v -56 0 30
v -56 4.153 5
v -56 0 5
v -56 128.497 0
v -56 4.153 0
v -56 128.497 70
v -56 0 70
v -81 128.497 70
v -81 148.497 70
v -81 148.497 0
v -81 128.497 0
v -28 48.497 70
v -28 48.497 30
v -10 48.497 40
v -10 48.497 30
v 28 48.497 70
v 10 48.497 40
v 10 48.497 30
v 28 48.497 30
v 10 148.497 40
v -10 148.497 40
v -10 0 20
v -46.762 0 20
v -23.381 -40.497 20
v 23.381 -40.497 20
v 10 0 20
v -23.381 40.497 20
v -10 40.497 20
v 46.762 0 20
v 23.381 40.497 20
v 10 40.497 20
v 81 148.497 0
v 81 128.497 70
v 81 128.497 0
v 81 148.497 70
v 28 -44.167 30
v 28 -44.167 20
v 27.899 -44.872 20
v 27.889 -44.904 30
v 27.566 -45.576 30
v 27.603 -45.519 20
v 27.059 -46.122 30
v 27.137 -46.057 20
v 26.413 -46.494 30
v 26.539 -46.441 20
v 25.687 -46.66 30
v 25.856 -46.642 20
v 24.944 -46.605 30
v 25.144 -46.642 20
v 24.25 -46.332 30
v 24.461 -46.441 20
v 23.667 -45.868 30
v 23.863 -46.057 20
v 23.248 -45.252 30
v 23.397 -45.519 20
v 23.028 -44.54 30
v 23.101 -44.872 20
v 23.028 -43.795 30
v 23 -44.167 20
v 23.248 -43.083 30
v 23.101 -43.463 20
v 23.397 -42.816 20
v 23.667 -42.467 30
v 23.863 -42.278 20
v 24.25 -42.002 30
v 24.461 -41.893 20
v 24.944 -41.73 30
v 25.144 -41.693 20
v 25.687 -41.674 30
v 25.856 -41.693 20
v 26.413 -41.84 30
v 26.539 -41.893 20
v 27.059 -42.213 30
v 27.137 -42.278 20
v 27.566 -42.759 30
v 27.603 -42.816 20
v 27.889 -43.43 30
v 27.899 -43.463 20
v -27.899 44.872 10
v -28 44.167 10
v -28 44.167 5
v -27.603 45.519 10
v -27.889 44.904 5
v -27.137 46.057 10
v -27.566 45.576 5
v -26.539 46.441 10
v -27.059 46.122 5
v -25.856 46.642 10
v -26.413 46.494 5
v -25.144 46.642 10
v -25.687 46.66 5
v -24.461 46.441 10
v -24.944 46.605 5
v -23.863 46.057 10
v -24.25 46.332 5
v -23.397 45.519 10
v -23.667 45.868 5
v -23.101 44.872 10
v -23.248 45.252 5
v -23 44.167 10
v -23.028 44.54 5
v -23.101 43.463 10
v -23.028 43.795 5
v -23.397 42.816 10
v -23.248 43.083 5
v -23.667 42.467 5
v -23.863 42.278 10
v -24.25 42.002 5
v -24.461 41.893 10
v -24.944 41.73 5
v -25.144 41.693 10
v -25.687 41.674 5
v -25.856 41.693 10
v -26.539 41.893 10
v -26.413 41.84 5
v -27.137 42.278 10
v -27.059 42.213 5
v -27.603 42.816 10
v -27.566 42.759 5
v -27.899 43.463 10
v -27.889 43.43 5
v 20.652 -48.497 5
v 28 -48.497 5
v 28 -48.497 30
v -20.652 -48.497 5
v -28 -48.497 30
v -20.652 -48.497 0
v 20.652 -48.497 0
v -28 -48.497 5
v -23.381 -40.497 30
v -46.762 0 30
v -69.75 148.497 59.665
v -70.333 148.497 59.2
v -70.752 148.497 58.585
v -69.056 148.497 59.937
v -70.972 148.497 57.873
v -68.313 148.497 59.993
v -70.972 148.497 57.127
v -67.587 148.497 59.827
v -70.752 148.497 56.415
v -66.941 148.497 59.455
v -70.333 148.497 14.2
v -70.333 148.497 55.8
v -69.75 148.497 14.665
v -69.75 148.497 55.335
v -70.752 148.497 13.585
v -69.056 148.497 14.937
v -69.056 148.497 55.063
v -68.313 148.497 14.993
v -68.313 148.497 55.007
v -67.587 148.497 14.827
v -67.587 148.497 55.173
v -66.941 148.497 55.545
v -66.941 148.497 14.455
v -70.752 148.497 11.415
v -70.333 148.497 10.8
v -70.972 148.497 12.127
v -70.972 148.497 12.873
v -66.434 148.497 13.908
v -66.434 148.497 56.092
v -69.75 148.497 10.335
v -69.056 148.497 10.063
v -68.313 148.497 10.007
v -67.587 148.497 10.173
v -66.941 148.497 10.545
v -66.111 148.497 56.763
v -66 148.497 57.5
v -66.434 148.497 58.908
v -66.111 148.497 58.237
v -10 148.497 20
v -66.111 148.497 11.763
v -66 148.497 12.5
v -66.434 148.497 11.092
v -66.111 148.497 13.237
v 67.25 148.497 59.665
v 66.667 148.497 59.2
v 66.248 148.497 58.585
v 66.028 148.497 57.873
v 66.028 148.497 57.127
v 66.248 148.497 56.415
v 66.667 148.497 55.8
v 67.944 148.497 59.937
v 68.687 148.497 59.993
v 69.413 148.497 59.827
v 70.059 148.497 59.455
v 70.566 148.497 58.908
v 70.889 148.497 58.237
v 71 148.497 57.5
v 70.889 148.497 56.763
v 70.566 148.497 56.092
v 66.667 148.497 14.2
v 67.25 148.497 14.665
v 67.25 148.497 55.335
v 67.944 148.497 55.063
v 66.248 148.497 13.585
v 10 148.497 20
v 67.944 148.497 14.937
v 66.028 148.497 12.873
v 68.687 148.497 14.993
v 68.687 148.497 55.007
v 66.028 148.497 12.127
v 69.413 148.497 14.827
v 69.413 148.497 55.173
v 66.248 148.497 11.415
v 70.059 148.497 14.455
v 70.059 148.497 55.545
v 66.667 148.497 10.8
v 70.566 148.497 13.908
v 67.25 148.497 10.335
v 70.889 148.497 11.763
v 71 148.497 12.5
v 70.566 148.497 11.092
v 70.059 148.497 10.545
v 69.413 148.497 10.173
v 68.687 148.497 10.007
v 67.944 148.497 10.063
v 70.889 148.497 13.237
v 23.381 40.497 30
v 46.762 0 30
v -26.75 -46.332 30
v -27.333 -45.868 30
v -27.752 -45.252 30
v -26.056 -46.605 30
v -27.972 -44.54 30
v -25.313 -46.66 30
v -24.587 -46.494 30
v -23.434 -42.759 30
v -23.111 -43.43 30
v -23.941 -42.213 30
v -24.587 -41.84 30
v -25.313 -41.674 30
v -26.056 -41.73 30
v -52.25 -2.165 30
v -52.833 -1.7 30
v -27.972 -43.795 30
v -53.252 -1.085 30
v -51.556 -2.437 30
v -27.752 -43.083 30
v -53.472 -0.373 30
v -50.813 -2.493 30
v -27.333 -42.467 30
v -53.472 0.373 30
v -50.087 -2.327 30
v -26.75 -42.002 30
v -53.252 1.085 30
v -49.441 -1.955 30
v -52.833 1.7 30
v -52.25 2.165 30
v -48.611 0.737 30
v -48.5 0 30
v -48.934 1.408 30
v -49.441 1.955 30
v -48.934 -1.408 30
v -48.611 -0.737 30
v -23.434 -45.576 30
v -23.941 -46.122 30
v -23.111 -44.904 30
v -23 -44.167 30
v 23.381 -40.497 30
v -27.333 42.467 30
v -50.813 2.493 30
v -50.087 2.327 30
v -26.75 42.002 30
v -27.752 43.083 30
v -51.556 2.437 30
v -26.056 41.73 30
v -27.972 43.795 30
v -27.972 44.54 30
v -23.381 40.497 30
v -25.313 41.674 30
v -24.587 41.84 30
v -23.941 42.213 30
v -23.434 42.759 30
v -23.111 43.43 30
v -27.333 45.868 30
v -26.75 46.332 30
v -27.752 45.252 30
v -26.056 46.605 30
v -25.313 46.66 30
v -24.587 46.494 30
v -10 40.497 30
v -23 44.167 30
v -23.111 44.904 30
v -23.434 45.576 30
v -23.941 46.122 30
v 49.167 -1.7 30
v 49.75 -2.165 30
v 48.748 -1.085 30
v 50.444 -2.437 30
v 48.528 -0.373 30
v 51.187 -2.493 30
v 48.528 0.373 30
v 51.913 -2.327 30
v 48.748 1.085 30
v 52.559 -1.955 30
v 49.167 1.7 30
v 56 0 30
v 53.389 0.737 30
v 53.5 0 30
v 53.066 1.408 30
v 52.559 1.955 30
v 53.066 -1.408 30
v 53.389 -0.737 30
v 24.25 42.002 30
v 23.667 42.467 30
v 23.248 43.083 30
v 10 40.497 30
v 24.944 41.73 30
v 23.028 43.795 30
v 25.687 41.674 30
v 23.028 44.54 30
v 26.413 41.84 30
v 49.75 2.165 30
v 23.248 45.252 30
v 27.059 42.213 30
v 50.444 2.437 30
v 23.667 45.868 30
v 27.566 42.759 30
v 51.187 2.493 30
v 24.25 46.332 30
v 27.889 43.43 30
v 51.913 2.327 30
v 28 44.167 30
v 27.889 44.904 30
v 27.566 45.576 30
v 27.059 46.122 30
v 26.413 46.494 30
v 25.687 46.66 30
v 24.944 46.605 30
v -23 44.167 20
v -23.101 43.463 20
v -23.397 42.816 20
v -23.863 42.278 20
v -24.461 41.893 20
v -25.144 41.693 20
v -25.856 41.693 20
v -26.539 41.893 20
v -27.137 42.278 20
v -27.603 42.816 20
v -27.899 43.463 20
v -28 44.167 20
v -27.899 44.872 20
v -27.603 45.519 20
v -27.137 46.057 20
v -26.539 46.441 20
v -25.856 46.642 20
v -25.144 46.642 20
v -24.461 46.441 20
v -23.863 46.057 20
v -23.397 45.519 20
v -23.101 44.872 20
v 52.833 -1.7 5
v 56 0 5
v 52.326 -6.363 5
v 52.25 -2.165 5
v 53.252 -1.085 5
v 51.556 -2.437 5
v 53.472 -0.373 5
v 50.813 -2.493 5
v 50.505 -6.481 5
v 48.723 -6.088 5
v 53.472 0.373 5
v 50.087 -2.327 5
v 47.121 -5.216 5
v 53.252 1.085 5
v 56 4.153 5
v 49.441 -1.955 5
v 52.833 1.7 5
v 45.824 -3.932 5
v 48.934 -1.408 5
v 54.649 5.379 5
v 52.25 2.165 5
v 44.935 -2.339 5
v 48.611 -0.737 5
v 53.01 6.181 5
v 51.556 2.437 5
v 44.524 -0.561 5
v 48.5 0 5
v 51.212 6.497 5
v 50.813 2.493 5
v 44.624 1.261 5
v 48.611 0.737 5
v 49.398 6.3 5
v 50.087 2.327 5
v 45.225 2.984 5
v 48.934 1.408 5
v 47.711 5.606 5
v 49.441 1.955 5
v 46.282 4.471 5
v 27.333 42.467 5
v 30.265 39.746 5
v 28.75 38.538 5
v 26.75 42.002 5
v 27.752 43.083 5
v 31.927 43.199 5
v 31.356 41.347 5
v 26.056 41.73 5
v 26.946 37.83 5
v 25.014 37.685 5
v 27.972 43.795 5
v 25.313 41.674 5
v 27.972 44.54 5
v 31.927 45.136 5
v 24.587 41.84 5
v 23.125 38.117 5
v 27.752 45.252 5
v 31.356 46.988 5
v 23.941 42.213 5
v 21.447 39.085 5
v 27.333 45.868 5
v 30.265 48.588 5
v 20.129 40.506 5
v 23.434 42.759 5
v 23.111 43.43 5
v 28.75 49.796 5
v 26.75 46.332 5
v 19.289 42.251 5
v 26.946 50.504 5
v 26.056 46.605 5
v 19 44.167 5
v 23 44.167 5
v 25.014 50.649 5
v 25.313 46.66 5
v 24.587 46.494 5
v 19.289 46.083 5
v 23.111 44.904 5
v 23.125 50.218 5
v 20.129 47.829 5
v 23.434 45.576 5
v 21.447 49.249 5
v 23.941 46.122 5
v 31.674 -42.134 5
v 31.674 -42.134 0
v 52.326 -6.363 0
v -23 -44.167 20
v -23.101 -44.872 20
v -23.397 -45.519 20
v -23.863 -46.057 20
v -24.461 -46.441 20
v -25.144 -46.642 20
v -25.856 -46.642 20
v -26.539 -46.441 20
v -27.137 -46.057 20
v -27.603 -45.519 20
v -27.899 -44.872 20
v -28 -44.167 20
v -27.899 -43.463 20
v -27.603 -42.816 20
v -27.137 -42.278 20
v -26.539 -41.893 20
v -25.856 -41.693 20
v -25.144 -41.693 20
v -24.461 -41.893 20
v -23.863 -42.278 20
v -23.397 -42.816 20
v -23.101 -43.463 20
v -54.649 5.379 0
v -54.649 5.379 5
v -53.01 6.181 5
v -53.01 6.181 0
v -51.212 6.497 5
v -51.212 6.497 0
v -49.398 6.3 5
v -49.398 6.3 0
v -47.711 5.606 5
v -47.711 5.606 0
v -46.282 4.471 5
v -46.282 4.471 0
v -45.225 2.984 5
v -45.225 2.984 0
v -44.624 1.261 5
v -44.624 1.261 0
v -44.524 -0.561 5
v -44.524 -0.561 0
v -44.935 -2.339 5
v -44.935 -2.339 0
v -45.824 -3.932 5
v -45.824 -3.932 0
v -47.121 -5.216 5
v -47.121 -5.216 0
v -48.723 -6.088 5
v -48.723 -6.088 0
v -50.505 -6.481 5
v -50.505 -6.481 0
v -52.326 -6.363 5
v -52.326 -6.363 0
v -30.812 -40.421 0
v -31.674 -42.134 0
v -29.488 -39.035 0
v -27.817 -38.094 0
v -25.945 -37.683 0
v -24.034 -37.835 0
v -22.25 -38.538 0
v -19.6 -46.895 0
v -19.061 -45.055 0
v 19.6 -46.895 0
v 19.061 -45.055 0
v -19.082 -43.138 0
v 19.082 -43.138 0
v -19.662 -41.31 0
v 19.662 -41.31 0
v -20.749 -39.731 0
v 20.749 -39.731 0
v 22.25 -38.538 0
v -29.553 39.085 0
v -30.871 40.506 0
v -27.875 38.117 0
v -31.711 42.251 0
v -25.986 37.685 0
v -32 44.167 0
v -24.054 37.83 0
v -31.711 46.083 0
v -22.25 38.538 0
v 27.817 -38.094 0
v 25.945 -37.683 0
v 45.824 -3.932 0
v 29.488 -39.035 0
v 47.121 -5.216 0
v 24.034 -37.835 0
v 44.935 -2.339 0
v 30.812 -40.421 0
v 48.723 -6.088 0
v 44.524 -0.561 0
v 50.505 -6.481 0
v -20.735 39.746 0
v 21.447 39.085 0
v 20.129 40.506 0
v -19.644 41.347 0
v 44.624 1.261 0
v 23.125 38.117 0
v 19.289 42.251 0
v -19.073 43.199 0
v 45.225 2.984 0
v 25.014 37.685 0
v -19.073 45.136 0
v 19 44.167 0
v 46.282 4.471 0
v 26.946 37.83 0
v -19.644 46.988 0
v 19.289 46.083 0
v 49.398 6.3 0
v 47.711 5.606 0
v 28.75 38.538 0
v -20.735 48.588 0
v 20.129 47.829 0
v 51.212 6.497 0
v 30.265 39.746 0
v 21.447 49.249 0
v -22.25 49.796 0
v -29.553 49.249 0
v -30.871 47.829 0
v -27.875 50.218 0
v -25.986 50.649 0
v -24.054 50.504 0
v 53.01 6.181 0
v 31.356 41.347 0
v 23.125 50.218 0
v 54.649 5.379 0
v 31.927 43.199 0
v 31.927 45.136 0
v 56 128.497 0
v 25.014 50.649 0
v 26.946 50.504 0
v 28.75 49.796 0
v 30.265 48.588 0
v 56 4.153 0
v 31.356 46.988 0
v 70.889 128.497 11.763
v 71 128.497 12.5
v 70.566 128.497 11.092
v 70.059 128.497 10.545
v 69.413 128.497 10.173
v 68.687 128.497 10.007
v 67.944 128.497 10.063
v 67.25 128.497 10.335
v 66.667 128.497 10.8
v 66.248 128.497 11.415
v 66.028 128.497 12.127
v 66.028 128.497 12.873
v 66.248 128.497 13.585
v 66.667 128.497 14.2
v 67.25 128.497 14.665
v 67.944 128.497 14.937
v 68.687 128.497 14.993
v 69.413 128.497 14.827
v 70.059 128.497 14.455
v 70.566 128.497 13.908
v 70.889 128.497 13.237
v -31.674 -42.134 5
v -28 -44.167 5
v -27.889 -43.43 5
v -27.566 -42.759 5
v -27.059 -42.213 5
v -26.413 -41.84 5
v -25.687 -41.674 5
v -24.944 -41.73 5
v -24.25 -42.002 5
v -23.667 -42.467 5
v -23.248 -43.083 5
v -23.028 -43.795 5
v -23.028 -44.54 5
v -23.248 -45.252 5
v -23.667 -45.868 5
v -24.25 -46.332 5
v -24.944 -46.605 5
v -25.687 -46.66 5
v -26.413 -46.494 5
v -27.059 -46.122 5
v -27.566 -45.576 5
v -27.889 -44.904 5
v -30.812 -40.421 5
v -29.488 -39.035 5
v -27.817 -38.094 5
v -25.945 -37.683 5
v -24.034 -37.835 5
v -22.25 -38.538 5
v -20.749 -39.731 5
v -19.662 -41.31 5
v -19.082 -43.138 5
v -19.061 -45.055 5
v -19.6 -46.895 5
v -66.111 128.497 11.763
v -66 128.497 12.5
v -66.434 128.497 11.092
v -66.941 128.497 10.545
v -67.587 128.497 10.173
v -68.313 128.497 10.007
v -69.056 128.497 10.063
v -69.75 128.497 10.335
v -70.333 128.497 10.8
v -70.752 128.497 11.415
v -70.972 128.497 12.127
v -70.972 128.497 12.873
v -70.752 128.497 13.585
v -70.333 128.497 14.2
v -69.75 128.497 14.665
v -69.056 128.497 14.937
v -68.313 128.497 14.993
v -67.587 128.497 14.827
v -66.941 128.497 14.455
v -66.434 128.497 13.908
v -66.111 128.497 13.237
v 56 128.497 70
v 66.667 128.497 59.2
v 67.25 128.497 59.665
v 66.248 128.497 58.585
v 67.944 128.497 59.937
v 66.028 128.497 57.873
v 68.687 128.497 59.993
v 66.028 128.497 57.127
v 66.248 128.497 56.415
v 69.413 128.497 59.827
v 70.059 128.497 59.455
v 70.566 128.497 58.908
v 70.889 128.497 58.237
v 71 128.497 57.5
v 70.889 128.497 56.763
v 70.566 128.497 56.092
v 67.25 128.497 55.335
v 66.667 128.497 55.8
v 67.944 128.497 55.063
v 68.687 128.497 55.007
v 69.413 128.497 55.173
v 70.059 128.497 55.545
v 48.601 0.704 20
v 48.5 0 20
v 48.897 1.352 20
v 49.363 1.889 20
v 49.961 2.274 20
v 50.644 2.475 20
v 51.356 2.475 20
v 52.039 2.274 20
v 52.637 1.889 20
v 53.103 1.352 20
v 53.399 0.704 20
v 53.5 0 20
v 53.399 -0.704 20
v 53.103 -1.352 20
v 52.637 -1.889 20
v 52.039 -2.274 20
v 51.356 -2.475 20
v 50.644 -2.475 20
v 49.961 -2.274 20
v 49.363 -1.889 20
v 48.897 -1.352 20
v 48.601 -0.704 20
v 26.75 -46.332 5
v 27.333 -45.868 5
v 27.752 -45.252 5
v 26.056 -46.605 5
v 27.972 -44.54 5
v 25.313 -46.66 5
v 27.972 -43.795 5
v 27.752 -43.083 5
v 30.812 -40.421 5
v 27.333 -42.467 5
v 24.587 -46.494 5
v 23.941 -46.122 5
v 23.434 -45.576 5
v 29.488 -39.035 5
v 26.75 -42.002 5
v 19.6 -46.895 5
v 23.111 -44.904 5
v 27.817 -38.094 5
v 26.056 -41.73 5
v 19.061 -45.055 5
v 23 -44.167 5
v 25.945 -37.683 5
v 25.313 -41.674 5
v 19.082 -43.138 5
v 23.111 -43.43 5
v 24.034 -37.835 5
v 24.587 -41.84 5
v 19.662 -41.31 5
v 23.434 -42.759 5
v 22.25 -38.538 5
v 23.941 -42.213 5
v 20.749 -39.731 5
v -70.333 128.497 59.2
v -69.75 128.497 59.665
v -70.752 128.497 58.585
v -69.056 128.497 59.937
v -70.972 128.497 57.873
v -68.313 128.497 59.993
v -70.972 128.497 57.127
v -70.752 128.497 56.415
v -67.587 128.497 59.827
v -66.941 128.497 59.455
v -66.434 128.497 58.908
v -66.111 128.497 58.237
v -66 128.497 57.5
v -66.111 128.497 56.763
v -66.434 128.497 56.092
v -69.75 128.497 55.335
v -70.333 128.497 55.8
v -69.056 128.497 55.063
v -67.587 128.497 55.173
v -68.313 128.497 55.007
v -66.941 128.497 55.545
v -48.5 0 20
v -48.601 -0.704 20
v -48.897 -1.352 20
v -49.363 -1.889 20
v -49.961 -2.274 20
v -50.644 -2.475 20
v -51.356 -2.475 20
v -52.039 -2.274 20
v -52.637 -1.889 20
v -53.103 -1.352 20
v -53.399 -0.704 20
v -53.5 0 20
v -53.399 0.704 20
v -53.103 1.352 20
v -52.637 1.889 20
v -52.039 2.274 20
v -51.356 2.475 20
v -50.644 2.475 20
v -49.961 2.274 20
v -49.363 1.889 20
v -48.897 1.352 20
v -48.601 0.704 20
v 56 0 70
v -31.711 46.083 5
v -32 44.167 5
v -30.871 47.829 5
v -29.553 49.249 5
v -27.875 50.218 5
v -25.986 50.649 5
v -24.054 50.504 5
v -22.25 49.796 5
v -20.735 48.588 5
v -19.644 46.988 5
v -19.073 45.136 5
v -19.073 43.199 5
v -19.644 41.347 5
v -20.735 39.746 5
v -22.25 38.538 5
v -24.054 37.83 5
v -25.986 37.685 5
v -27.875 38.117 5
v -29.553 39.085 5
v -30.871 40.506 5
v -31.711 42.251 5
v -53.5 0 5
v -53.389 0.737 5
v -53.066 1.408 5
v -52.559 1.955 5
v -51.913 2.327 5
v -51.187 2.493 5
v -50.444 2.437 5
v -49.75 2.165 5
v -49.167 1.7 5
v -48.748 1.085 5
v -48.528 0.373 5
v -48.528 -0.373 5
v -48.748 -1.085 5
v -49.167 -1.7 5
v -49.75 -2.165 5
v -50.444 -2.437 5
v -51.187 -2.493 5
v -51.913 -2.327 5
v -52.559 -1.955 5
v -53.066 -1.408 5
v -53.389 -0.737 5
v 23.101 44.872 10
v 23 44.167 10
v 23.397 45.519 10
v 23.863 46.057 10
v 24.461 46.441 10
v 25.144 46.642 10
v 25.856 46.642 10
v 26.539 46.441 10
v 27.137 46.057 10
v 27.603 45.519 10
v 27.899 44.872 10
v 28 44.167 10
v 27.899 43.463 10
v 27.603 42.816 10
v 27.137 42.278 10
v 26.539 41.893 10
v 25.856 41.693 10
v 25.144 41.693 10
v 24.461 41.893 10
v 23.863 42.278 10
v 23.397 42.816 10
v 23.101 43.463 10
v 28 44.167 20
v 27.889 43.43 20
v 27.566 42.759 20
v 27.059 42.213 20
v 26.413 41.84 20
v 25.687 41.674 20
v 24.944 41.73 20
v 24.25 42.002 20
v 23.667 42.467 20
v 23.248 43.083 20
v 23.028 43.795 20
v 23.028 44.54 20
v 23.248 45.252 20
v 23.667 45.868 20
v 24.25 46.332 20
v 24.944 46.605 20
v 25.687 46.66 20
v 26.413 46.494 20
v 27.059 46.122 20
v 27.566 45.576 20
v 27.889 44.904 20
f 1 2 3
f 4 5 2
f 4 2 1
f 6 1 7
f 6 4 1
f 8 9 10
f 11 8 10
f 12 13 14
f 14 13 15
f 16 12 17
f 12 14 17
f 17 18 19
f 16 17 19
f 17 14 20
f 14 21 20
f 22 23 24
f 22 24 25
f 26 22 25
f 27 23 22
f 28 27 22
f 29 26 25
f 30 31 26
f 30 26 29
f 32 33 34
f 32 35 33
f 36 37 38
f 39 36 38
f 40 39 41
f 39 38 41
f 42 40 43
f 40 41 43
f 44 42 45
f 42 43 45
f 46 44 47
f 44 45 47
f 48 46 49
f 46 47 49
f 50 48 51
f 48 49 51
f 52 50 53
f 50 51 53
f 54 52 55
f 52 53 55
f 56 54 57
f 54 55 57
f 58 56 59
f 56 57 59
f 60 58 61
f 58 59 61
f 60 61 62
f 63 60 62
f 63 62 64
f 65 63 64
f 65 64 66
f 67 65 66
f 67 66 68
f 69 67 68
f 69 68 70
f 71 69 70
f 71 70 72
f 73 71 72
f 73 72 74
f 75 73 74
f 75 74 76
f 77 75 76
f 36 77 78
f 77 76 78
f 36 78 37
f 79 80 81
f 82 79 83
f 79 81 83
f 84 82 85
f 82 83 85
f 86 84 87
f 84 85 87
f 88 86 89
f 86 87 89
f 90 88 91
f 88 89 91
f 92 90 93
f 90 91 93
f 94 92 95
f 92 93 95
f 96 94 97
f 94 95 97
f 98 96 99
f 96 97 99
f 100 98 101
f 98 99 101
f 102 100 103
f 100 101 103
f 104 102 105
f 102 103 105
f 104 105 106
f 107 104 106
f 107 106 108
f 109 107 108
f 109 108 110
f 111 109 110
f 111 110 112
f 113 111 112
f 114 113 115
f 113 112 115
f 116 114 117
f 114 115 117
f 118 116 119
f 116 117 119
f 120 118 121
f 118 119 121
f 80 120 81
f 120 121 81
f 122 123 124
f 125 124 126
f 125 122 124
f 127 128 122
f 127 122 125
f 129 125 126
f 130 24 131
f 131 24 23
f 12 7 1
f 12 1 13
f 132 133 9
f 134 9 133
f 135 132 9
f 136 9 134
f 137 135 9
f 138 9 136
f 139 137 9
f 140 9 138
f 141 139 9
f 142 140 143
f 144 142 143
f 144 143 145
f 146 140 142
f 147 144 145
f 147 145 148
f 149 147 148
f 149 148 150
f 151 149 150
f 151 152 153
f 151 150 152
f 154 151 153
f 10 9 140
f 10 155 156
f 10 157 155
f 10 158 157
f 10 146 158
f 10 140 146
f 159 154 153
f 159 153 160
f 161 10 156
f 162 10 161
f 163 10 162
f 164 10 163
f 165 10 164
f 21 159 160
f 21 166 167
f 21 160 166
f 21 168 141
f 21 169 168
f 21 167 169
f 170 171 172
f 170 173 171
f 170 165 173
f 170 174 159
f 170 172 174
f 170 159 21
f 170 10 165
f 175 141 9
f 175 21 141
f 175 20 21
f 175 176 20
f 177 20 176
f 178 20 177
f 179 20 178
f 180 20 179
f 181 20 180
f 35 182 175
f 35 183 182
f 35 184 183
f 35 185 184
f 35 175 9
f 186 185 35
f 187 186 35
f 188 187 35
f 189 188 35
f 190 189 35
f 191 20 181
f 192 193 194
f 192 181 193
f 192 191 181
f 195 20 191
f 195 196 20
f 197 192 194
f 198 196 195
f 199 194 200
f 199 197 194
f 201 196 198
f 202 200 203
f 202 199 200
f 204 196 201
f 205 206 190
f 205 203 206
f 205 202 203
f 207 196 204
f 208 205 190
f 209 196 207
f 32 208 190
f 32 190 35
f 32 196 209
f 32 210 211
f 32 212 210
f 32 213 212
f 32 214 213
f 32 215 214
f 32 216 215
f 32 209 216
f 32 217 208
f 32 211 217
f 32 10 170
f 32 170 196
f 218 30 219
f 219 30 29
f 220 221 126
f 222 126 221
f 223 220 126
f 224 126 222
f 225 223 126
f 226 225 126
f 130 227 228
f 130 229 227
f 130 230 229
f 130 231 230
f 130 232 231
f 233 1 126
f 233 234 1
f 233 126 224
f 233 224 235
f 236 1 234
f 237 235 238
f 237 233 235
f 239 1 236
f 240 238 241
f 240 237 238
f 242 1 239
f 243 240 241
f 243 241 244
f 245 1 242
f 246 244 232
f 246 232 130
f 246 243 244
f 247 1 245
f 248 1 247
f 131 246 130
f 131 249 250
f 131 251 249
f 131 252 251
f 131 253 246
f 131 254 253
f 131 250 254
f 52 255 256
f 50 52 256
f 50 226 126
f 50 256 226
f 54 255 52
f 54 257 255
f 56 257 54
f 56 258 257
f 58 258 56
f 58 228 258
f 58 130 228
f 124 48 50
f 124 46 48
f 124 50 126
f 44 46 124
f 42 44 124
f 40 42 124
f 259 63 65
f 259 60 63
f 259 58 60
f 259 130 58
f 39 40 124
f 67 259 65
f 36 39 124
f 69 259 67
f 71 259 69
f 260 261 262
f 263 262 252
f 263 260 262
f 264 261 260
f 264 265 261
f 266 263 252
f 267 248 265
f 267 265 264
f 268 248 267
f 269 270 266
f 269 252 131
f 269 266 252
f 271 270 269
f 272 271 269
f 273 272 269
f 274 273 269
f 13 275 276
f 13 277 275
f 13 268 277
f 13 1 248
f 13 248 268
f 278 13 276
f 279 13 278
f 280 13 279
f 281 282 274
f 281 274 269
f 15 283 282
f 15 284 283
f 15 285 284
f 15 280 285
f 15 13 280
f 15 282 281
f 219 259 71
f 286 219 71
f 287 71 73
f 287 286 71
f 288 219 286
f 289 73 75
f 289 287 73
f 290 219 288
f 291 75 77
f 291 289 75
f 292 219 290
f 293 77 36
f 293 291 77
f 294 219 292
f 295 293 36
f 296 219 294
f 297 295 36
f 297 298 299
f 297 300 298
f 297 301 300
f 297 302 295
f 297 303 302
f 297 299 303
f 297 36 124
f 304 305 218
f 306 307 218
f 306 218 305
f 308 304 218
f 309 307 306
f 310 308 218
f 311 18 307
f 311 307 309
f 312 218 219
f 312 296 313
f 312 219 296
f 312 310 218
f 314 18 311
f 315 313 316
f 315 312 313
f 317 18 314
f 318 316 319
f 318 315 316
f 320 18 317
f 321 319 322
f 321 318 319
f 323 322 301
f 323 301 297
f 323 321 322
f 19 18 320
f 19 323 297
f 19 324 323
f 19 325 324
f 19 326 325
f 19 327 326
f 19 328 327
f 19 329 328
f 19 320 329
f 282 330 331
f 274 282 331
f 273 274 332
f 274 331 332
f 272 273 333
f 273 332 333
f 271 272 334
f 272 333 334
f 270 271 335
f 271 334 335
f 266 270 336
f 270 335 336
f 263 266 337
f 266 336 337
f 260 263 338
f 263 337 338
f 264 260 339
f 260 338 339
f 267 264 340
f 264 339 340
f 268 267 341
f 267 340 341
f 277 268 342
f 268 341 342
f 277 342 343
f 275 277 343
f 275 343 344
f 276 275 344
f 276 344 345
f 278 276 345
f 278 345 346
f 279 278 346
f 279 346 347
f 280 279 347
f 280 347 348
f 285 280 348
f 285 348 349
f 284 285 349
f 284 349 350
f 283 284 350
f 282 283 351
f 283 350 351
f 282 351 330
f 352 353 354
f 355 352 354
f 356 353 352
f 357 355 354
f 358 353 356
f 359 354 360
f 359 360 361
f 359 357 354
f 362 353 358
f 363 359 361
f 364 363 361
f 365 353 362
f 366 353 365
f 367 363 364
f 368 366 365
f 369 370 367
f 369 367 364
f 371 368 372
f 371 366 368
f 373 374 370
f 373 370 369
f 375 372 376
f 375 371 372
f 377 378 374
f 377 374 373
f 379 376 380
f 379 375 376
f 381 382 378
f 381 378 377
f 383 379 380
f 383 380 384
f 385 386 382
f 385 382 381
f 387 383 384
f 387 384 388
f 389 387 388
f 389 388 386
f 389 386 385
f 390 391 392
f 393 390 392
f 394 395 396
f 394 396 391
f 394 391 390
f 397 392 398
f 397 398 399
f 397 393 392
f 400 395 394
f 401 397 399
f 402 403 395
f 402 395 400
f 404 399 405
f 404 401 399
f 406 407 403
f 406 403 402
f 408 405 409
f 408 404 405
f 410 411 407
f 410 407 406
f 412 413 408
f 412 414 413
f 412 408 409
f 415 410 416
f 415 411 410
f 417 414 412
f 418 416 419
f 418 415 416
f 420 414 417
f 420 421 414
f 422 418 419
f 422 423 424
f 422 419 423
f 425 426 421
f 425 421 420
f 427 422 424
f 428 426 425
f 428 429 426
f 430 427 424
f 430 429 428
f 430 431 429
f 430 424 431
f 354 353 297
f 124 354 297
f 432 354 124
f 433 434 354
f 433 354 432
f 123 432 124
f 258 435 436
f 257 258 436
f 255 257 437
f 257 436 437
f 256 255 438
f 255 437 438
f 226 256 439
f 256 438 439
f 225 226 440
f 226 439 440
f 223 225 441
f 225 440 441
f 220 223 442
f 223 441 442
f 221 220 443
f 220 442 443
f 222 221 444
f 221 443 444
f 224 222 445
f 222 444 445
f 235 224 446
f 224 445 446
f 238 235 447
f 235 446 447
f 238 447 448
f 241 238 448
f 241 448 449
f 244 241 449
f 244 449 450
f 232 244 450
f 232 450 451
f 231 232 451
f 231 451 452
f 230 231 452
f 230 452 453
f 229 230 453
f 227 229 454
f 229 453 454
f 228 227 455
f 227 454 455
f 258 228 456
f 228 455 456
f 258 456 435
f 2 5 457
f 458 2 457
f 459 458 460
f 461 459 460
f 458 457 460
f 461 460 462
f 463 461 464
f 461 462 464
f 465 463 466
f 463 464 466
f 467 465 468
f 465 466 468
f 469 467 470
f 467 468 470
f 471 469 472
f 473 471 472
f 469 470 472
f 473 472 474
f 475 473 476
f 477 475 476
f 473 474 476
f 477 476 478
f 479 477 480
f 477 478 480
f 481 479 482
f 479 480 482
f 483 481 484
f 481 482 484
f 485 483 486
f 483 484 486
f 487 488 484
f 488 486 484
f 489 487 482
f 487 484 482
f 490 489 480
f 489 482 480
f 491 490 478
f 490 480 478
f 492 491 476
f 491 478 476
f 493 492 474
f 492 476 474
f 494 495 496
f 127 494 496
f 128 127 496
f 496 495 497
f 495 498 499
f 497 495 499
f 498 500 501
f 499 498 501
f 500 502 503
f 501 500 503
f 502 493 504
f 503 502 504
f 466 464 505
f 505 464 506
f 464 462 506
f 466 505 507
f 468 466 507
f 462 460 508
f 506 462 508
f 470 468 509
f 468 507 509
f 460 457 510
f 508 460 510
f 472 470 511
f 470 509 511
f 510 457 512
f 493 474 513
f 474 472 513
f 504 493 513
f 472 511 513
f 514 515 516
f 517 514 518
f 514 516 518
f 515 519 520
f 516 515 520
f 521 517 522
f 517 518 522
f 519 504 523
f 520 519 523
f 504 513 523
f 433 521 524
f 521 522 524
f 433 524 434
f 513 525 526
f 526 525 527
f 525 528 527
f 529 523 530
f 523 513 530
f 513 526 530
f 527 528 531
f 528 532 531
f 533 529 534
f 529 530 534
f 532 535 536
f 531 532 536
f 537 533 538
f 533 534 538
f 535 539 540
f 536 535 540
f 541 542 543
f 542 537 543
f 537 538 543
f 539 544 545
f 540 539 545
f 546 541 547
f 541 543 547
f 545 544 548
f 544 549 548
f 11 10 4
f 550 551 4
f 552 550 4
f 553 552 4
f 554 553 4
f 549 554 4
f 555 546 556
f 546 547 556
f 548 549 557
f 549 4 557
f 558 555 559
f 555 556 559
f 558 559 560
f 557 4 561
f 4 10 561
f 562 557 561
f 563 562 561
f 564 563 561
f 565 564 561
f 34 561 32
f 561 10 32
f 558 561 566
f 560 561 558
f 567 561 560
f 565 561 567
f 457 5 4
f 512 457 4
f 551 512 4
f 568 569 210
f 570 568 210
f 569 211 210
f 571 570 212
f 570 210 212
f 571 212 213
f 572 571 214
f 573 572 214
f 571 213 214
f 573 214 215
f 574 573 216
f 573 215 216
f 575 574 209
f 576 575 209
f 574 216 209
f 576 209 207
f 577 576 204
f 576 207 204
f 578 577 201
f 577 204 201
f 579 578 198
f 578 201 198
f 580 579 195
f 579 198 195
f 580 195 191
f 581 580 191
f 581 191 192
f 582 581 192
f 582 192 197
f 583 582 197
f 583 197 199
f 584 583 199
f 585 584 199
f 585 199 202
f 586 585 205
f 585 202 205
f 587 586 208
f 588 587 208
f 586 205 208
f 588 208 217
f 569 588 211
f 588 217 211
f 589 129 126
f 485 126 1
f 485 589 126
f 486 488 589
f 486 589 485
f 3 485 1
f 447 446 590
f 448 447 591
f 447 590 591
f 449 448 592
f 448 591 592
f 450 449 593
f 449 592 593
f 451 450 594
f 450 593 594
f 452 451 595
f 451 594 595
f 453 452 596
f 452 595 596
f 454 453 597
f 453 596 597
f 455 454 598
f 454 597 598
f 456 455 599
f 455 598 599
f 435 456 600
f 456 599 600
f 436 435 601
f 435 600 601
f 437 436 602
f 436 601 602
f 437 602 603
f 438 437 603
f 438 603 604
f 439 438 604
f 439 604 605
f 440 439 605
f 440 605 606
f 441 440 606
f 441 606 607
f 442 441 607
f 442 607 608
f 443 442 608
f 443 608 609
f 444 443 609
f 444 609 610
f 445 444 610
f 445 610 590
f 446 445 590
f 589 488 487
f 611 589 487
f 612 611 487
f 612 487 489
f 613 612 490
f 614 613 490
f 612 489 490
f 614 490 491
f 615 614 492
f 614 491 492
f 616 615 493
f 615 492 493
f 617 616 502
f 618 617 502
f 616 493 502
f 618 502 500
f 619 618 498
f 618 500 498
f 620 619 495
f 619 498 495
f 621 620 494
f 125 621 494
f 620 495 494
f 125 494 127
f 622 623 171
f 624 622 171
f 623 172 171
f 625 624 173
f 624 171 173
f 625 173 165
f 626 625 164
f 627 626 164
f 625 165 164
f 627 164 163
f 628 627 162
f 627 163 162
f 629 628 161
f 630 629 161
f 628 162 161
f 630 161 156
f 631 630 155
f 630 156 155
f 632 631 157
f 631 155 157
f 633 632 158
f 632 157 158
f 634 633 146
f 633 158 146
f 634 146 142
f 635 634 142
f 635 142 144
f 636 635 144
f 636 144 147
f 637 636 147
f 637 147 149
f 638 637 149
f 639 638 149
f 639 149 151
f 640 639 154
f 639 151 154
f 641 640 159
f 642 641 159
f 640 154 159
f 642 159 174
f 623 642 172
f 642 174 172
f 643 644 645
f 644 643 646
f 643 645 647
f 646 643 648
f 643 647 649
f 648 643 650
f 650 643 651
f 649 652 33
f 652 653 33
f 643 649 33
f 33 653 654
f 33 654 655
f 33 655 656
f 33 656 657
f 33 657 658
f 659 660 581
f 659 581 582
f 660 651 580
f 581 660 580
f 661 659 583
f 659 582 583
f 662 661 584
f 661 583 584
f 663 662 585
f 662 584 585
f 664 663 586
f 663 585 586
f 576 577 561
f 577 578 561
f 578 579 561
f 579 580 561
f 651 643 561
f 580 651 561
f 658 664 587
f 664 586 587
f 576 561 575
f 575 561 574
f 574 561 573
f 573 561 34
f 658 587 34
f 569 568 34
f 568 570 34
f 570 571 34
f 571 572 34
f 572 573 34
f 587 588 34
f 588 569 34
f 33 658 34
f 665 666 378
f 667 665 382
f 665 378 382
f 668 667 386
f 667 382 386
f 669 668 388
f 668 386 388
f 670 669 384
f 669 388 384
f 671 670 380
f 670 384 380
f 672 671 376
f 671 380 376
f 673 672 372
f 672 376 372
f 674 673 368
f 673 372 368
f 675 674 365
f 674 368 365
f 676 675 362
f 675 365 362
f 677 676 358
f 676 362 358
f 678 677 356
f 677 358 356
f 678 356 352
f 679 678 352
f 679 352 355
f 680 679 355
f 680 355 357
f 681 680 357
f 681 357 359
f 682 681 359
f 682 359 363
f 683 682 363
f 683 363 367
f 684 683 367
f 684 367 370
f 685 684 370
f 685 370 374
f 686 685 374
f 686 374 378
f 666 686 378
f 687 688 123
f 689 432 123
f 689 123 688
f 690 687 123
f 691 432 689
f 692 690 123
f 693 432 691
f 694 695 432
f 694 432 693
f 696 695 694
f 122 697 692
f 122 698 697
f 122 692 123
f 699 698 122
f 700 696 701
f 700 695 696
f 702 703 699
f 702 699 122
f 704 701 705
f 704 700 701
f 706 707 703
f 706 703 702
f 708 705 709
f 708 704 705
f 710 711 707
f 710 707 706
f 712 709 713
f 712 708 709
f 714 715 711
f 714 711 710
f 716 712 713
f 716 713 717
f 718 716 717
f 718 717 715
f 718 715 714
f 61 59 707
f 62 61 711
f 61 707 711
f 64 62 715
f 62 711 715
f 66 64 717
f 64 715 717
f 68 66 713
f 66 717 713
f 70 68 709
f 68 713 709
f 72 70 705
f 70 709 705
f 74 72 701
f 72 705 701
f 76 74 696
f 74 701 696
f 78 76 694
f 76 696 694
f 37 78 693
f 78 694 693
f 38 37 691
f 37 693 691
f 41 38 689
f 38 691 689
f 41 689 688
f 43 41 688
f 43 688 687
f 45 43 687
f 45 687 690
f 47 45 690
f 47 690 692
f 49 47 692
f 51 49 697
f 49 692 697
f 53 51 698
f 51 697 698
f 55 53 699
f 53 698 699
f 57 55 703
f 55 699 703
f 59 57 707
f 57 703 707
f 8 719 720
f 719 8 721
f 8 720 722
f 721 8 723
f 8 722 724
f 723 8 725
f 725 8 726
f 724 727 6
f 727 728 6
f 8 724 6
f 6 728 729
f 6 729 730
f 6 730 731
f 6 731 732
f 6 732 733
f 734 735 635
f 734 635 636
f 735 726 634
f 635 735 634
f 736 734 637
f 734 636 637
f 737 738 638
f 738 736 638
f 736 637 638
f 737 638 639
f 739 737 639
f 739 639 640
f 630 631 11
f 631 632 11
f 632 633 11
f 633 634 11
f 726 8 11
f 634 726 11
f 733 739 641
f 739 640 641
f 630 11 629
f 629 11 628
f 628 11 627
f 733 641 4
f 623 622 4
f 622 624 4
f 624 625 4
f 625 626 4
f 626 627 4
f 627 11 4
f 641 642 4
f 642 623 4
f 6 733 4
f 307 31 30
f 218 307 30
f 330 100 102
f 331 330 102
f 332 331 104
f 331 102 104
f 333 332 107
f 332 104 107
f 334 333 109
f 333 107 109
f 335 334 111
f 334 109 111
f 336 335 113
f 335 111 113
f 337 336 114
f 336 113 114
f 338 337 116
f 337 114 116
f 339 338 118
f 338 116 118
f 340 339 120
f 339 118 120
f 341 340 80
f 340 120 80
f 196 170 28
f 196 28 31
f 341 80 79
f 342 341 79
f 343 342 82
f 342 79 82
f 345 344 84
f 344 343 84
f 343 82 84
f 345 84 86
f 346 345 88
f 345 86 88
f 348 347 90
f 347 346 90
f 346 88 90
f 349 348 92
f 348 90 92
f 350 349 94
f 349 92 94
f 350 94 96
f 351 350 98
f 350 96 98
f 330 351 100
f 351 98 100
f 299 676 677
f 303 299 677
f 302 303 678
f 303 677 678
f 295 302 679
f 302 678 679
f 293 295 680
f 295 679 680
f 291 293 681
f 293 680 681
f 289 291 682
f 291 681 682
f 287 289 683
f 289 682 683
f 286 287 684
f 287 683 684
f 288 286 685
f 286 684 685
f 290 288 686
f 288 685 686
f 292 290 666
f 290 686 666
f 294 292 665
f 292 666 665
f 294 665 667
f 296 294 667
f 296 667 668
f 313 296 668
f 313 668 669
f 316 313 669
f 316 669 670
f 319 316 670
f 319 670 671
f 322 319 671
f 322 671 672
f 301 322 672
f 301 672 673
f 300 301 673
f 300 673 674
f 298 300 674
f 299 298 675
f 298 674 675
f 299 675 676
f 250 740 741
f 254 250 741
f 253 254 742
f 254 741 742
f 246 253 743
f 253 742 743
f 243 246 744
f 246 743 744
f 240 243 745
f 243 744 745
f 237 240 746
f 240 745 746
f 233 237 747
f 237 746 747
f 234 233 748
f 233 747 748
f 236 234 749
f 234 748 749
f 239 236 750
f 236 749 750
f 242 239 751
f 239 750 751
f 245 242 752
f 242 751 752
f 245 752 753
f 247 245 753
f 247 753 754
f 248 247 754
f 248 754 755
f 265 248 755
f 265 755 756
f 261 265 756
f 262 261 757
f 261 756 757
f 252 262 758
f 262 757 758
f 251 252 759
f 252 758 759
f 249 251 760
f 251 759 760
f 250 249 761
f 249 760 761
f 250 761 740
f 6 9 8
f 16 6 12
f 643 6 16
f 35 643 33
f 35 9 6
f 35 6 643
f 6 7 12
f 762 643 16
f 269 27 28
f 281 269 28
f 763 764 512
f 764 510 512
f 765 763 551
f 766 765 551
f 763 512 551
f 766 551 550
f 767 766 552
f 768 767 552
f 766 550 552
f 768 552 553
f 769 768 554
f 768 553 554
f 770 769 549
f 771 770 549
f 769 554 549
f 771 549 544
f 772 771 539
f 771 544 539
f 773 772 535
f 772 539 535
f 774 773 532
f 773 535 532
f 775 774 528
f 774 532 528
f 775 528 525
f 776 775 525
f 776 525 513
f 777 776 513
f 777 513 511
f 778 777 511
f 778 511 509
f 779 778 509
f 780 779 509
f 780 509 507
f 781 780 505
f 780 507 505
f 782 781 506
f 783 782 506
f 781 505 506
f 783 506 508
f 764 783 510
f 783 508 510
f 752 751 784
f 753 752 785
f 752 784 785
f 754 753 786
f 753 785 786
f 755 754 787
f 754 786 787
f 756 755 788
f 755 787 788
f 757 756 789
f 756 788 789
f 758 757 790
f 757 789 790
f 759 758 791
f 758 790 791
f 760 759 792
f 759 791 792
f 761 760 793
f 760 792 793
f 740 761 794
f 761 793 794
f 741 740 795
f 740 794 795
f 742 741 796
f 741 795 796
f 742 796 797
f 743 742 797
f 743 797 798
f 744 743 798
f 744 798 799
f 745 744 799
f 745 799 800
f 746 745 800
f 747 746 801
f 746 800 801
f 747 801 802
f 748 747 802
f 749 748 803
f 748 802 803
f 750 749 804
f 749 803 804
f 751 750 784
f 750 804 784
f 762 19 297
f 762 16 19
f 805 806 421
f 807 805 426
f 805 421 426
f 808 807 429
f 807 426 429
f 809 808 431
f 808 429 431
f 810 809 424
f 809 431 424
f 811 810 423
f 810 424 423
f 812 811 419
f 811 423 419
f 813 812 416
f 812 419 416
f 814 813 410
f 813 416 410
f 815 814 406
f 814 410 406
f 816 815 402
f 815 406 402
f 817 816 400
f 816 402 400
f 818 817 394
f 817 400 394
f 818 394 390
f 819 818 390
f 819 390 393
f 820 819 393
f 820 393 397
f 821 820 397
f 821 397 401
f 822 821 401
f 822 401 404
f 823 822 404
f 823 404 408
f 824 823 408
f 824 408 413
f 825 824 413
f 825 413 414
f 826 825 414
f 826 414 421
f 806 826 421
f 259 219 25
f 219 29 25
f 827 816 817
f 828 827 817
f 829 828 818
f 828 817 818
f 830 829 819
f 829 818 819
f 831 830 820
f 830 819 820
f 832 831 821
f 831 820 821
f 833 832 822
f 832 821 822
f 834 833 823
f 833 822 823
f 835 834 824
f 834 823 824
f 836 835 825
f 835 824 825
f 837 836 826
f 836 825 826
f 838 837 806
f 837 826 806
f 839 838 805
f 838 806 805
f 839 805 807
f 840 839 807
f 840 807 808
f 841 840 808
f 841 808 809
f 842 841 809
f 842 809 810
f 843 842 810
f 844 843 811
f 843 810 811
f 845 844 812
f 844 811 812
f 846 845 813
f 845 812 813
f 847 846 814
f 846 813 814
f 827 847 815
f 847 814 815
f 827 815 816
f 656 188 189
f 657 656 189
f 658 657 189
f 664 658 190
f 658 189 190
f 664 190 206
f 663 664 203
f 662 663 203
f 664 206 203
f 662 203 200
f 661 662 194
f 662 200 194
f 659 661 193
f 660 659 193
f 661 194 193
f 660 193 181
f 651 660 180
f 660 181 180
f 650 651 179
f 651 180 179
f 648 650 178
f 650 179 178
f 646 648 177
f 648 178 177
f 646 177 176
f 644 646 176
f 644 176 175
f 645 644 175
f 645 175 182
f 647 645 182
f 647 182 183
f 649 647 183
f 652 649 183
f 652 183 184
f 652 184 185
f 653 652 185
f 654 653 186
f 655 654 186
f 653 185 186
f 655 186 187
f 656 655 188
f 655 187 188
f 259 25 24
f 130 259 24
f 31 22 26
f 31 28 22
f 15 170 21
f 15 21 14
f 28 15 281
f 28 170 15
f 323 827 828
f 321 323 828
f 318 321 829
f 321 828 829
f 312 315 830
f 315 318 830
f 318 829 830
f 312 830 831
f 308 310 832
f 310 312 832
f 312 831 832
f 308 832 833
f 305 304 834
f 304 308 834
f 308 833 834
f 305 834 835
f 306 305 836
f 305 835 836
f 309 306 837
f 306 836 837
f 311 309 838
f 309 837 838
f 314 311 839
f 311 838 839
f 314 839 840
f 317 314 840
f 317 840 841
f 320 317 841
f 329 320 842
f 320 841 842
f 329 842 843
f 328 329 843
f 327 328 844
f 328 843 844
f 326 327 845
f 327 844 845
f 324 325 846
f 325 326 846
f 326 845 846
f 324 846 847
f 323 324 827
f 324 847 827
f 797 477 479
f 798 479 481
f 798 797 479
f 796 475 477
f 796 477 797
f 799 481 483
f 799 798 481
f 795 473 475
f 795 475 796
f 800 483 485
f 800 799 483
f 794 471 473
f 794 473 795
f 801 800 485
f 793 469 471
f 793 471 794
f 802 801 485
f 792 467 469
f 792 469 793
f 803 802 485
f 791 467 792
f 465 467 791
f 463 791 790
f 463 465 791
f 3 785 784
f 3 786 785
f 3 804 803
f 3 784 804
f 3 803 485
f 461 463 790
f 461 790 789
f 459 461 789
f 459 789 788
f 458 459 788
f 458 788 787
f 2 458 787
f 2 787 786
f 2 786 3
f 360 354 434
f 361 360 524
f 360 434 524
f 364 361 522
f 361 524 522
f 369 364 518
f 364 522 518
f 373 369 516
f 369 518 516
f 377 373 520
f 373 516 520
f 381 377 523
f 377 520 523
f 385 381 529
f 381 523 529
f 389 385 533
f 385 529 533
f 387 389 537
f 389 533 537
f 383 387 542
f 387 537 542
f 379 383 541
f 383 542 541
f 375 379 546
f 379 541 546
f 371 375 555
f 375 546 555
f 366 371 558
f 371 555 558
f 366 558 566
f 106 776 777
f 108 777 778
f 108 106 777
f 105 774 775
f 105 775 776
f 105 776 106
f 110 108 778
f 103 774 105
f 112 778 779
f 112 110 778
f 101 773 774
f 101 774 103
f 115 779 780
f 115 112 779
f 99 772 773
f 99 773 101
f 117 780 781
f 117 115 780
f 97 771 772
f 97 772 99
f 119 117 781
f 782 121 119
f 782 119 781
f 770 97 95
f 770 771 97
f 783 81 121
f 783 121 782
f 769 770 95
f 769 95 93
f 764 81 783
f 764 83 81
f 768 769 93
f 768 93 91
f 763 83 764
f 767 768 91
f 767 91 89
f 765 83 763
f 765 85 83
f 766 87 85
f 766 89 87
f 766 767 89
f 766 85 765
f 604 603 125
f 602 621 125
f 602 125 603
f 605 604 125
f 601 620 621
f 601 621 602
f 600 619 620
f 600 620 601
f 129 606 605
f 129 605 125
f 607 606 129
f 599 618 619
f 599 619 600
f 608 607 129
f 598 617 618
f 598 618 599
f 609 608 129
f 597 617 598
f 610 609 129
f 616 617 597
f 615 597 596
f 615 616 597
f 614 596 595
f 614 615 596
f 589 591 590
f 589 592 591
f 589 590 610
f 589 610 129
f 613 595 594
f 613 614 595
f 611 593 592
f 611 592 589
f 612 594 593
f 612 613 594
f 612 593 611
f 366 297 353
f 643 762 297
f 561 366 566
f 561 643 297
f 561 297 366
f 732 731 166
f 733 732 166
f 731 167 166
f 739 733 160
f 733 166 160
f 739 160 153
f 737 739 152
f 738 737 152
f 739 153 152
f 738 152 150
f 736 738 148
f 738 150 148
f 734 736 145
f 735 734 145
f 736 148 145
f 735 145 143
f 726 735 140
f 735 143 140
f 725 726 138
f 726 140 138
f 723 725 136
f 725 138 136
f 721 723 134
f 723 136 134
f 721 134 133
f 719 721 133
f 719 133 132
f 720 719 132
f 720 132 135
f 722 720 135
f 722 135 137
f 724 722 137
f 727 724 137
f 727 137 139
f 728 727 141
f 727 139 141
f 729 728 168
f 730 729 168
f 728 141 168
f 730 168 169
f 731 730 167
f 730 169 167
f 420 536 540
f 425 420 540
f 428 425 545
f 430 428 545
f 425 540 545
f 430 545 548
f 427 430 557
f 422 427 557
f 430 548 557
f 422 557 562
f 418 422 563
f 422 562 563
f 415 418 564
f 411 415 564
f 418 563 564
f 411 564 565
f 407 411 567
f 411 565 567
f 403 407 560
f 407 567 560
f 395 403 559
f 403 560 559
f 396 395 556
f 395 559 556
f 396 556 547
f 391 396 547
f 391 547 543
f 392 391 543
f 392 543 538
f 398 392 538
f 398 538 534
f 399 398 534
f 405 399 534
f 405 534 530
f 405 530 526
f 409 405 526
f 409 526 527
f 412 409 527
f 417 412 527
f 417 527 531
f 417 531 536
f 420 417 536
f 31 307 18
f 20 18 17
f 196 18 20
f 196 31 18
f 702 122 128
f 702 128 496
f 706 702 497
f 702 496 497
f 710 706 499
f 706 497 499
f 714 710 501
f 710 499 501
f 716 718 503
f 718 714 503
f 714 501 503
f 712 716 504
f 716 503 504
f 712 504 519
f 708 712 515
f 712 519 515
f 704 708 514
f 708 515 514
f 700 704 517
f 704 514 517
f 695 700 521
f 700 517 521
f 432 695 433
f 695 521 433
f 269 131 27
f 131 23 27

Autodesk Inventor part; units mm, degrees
ref_plane "YZ Plane" through (0, 0, 0) normal (1, 0, 0) x (0, 1, 0)
ref_plane "XZ Plane" through (0, 0, 0) normal (0, 1, 0) x (-1, 0, 0)
ref_plane "XY Plane" through (0, 0, 0) normal (0, 0, 1) x (1, 0, 0)
sketch "Sketch5" plane through (0, 0, 0) normal (0, 0, 1) x (1, 0, 0)
  line L0 (56, 0) -> (28, -48.4974)
  line L1 (28, -48.4974) -> (-28, -48.4974)
  line L2 (-28, -48.4974) -> (-56, 0)
  line L3 (-56, 0) -> (-28, 48.4974)
  line L4 (-28, 48.4974) -> (28, 48.4974)
  line L5 (28, 48.4974) -> (56, 0)
  circle A0 centre (0, 30) radius 2.5
  circle A1 centre (-25.9808, 15) radius 2.5
  circle A2 centre (-25.9808, -15) radius 2.5
  circle A3 centre (0, -30) radius 2.5
  circle A4 centre (25.9808, -15) radius 2.5
  circle A5 centre (25.9808, 15) radius 2.5
  point P0 (0, 0)
  point P1 (0, 0)
  dimension "d28" = 112
  dimension "d29" = 5
  dimension "d30" = 30
  dimension "d33" = 360
extrude "Extrusion3" add sketch "Sketch5" along normal blind 10
sketch "Sketch6" plane through (0, 0, 10) normal (0, 0, 1) x (1, 0, 0)
  circle A0 centre (25.9808, 15) radius 2.5 construction
  circle A1 centre (25.9808, -15) radius 2.5 construction
  circle A2 centre (0, -30) radius 2.5 construction
  circle A3 centre (-25.9808, -15) radius 2.5 construction
  circle A4 centre (-25.9808, 15) radius 2.5 construction
  circle A5 centre (0, 30) radius 2.5 construction
  line L0 (28, -48.4974) -> (56, 0) projected
  line L1 (56, 0) -> (28, 48.4974) projected
  line L2 (28, 48.4974) -> (-28, 48.4974) projected
  line L3 (-28, 48.4974) -> (-56, 0) projected
  line L4 (-56, 0) -> (-28, -48.4974) projected
  line L5 (-28, -48.4974) -> (28, -48.4974) projected
  line L6 (-44.453, 0) -> (-22.2265, 38.4974)
  line L7 (-22.2265, 38.4974) -> (22.2265, 38.4974)
  line L8 (22.2265, 38.4974) -> (44.453, 0)
  line L9 (44.453, 0) -> (22.2265, -38.4974)
  line L10 (22.2265, -38.4974) -> (-22.2265, -38.4974)
  line L11 (-22.2265, -38.4974) -> (-44.453, 0)
  point P0 (0, 0)
  dimension "d37" = 10
extrude "Extrusion4" add sketch "Sketch6" along normal blind 50
sketch "Sketch7" plane through (0, 0, 60) normal (0, 0, 1) x (1, 0, 0)
  line L0 (-22.2265, 38.4974) -> (22.2265, 38.4974) projected
  line L1 (22.2265, 38.4974) -> (44.453, 0) projected
  line L2 (44.453, 0) -> (22.2265, -38.4974) projected
  line L3 (22.2265, -38.4974) -> (-22.2265, -38.4974) projected
  line L4 (-22.2265, -38.4974) -> (-44.453, 0) projected
  line L5 (-44.453, 0) -> (-22.2265, 38.4974) projected
  line L6 (28, -48.4974) -> (56, 0) projected
  line L7 (56, 0) -> (28, 48.4974) projected
  line L8 (28, 48.4974) -> (-28, 48.4974) projected
  line L9 (-28, 48.4974) -> (-56, 0) projected
  line L10 (-56, 0) -> (-28, -48.4974) projected
  line L11 (-28, -48.4974) -> (28, -48.4974) projected
  point P0 (0, 0)
extrude "Extrusion5" add sketch "Sketch7" along normal blind 10 contours L0 L1 L2 L3 L4 L5 | L11 L10 L9 L8 L7 L6
sketch "Sketch8" plane through (-28, 48.4974, 0) normal (0, 1, 0) x (1, 0, 0)
  line L0 (-28, -70) -> (0, -70) projected
  line L1 (-28, -70) -> (84, -70)
  line L2 (84, -70) -> (84, 0)
  line L3 (84, 0) -> (-28, 0)
  line L4 (-28, 0) -> (-28, -70)
  line L5 (0, 0) -> (56, 0) projected
  point P0 (28, 0)
  point P1 (28, 0)
  dimension "d42" = 112
extrude "Extrusion6" add sketch "Sketch8" against normal blind 48.4974 and the other way blind 100
sketch "Sketch9" plane through (-28, 148.4974, 0) normal (0, 1, 0) x (1, 0, 0)
  line L0 (-16.453, -60) -> (72.453, -60) projected
  line L1 (72.453, -10) -> (72.453, -60) projected
  line L2 (-16.453, -10) -> (-16.453, -60) projected
  line L3 (50.2265, -10) -> (72.453, -10) projected
  line L4 (72.453, -10) -> (-16.453, -10)
  point P0 (28, 0)
extrude "Extrusion7" cut sketch "Sketch9" against normal blind 100
sketch "Sketch10" plane through (0, 0, 0) normal (0, 0, -1) x (-1, 0, 0)
  circle A0 centre (-25.9808, -15) radius 2.5 projected
  circle A1 centre (-25.9808, -15) radius 2.5 projected
  circle A2 centre (-25.9808, -15) radius 2.5
  circle A3 centre (0, -30) radius 2.5
  circle A4 centre (25.9808, -15) radius 2.5
  circle A5 centre (25.9808, 15) radius 2.5
  circle A6 centre (0, 30) radius 2.5
  circle A7 centre (-25.9808, 15) radius 2.5
  point P0 (0, 0)
  dimension "d52" = 360
extrude "Extrusion8" cut sketch "Sketch10" against normal blind 10
sketch "Sketch12" plane through (0, 0, 70) normal (0, 0, 1) x (1, 0, 0)
  line L0 (56, 0) -> (28, -48.4974) projected
  line L1 (56, 0) -> (28, -48.4974)
  line L2 (28, -48.4974) -> (-28, -48.4974)
  line L3 (-28, -48.4974) -> (-56, 0)
  line L4 (-56, 0) -> (-28, 48.4974)
  line L5 (-28, 48.4974) -> (28, 48.4974)
  line L6 (28, 48.4974) -> (56, 0)
  point P0 (0, 0)
  point P1 (0, 0)
extrude "Extrusion9" cut sketch "Sketch12" against normal blind 50
sketch "Sketch13" plane through (0, 0, 10) normal (0, 0, 1) x (1, 0, 0)
  line L0 (22.2265, -38.4974) -> (44.453, 0) projected
  line L1 (22.2265, -38.4974) -> (-22.2265, -38.4974)
  line L2 (-22.2265, -38.4974) -> (-44.453, 0)
  line L3 (-44.453, 0) -> (-22.2265, 38.4974)
  line L4 (-22.2265, 38.4974) -> (22.2265, 38.4974)
  line L5 (22.2265, 38.4974) -> (44.453, 0)
  line L6 (44.453, 0) -> (22.2265, -38.4974)
  point P0 (0, 0)
  point P1 (0, 0)
extrude "Extrusion10" cut sketch "Sketch13" along normal blind 10
sketch "Sketch14" plane through (-44.453, 148.4974, 10) normal (0, 0, 1) x (1, 0, 0)
  line L0 (-11.547, -148.4974) -> (16.453, -100) projected
  line L1 (16.453, -100) -> (16.453, -120)
  line L2 (0, -148.4974) -> (22.2265, -110) projected
  line L3 (16.453, -100) -> (72.453, -100) projected
  line L4 (72.453, -100) -> (72.453, -120)
  line L5 (66.6795, -110) -> (88.906, -148.4974) projected
  line L6 (16.453, -120) -> (72.453, -120)
  line L7 (16.453, -100) -> (72.453, -100)
  point P0 (44.453, -148.4974)
extrude "Extrusion11" cut sketch "Sketch14" along normal blind 10
sketch "Sketch15" plane through (-28, 148.4974, 0) normal (0, 1, 0) x (1, 0, 0)
  line L0 (-28, -20) -> (-28, -70) projected
  line L1 (-28, -70) -> (-53, -70)
  line L2 (-53, -70) -> (-53, 0)
  line L3 (-53, 0) -> (-28, 0)
  line L4 (-28, 0) -> (-28, -70)
  line L5 (-28, -70) -> (84, -70) projected
  line L6 (84, -70) -> (109, -70)
  line L7 (109, -70) -> (109, 0)
  line L8 (109, 0) -> (84, 0)
  line L9 (84, 0) -> (84, -70)
  circle A0 centre (96.5, -57.5) radius 2.5
  circle A1 centre (96.5, -12.5) radius 2.5
  circle A2 centre (-40.5, -12.5) radius 2.5
  circle A3 centre (-40.5, -57.5) radius 2.5
  line L10 (96.5, -57.5) -> (96.5, -12.5) construction
  line L11 (-40.5, -12.5) -> (-40.5, -57.5) construction
  point P0 (28, 0)
  point P1 (-40.5, -70)
  point P2 (-40.5, 0)
  point P3 (96.5, 0)
  point P4 (96.5, -70)
  point P5 (96.5, -35)
  point P6 (109, -35)
  dimension "d62" = 25
  dimension "d63" = 25
  dimension "d64" = 5
  dimension "d65" = 5
  dimension "d66" = 5
  dimension "d67" = 5
  dimension "d68" = 45
extrude "Extrusion12" add sketch "Sketch15" against normal blind 20
sketch "Sketch16" plane through (-28, 48.4974, 0) normal (0, 1, 0) x (1, 0, 0)
  line L0 (0, -20) -> (0, -10) projected
  line L1 (-16.453, -10) -> (0, -10) projected
  line L2 (-16.453, -60) -> (-16.453, -10) projected
  line L3 (0, -60) -> (-16.453, -60) projected
  line L4 (0, -60) -> (0, -20) projected
  line L5 (72.453, -10) -> (72.453, -60) projected
  line L6 (56, -10) -> (56, -20) projected
  line L7 (56, -20) -> (56, -60) projected
  line L8 (72.453, -60) -> (56, -60) projected
  line L9 (72.453, -10) -> (72.453, -60) projected
  line L10 (56, -10) -> (72.453, -10) projected
  point P0 (28, 0)
extrude "Extrusion13" add sketch "Sketch16" along normal blind 100
sketch "Sketch17" plane through (0, 0, 0) normal (0, 0, -1) x (-1, 0, 0)
  circle A0 centre (-51, 0) radius 2.5
  circle A1 centre (-25.5, -44.1673) radius 2.5
  circle A2 centre (25.5, -44.1673) radius 2.5
  circle A3 centre (51, 0) radius 2.5
  circle A4 centre (25.5, 44.1673) radius 2.5
  circle A5 centre (-25.5, 44.1673) radius 2.5
  point P0 (0, 0)
  point P1 (-56, 0)
  dimension "d73" = 5
  dimension "d74" = 5
  dimension "d77" = 360
extrude "Extrusion14" cut sketch "Sketch17" against normal through all
sketch "Sketch18" plane through (0, 0, 0) normal (0, 0, -1) x (-1, 0, 0)
  circle A0 centre (-51, 0) radius 2.5 projected
  circle A1 centre (-51, 0) radius 6.5
  circle A2 centre (-25.5, 44.1673) radius 6.5
  circle A3 centre (25.5, 44.1673) radius 6.5
  circle A4 centre (51, 0) radius 6.5
  circle A5 centre (25.5, -44.1673) radius 6.5
  circle A6 centre (-25.5, -44.1673) radius 6.5
  point P0 (0, 0)
  dimension "d81" = 13
  dimension "d84" = 360
extrude "Extrusion15" cut sketch "Sketch18" against normal blind 5 contours A0 | A1 | A2 | A3 | A4 | A5 | A6
sketch "Sketch19" plane through (0, 0, 10) normal (0, 0, 1) x (1, 0, 0)
  circle A0 centre (0, -30) radius 2.5 projected
  circle A1 centre (-25.9808, -15) radius 2.5 projected
  circle A2 centre (-25.9808, 15) radius 2.5 projected
  circle A3 centre (0, 30) radius 2.5 projected
  circle A4 centre (25.9808, 15) radius 2.5 projected
  circle A5 centre (25.9808, -15) radius 2.5 projected
  point P0 (0, 0)
extrude "Extrusion16" add sketch "Sketch19" against normal blind 10
sketch "Sketch20" plane through (-28, 148.4974, 0) normal (0, 1, 0) x (1, 0, 0)
  line L0 (56, -60) -> (0, -60) projected
  line L1 (0, -60) -> (0, -10) projected
  line L2 (0, -10) -> (56, -10) projected
  line L3 (56, -10) -> (56, -60) projected
  line L4 (5.7735, -20) -> (50.2265, -20) projected
  line L5 (50.2265, -20) -> (72.453, -20) projected
  line L6 (-16.453, -20) -> (5.7735, -20) projected
  line L7 (56, -20) -> (56, -10) projected
  line L8 (56, -20) -> (0, -20)
  line L9 (0, -20) -> (0, -60)
  line L10 (0, -60) -> (56, -60)
  line L11 (56, -60) -> (56, -20)
  point P0 (28, 0)
extrude "Extrusion17" add sketch "Sketch20" against normal blind 100 contours L0 L1 L6 L4 L5 L3
sketch "Sketch21" plane through (0, 0, 10) normal (0, 0, 1) x (1, 0, 0)
  line L0 (-28, 148.4974) -> (-28, 44.1673) projected
  circle A0 centre (-25.5, 44.1673) radius 2.5 projected
  line L1 (-28, 44.1673) -> (-28, 28.4974) projected
  line L2 (-44.453, 0) -> (-28, 28.4974) projected
  line L3 (-44.453, 0) -> (-22.2265, -38.4974) projected
  line L4 (-22.2265, -38.4974) -> (22.2265, -38.4974) projected
  line L5 (22.2265, -38.4974) -> (44.453, 0) projected
  line L6 (28, 28.4974) -> (44.453, 0) projected
  line L7 (28, 28.4974) -> (28, 44.1673) projected
  circle A1 centre (25.5, 44.1673) radius 2.5 projected
  line L8 (28, 44.1673) -> (28, 148.4974) projected
  line L9 (-28, 148.4974) -> (28, 148.4974) projected
  point P0 (0, 0)
extrude "Extrusion18" add sketch "Sketch21" along normal blind 10
sketch "Sketch22" plane through (0, 0, 20) normal (0, 0, 1) x (1, 0, 0)
  circle A0 centre (25.5, 44.1673) radius 2.5 projected
  line L0 (-28, 48.4974) -> (28, 48.4974) projected
  line L1 (-56, 0) -> (-28, 48.4974) projected
  line L2 (-28, -48.4974) -> (-56, 0) projected
  line L3 (28, -48.4974) -> (-28, -48.4974) projected
  line L4 (56, 0) -> (28, -48.4974) projected
  line L5 (28, 48.4974) -> (56, 0) projected
  circle A1 centre (-25.5, -44.1673) radius 2.5 projected
  circle A2 centre (51, 0) radius 2.5 projected
  circle A3 centre (25.5, -44.1673) radius 2.5 projected
  circle A4 centre (-51, 0) radius 2.5 projected
  circle A5 centre (-25.5, 44.1673) radius 2.5 projected
  line L6 (-46.7624, 0) -> (-23.3812, 40.4974)
  line L7 (-23.3812, 40.4974) -> (23.3812, 40.4974)
  line L8 (23.3812, 40.4974) -> (46.7624, 0)
  line L9 (46.7624, 0) -> (23.3812, -40.4974)
  line L10 (23.3812, -40.4974) -> (-23.3812, -40.4974)
  line L11 (-23.3812, -40.4974) -> (-46.7624, 0)
  point P0 (0, 0)
  dimension "d94" = 8
extrude "Extrusion19" add sketch "Sketch22" along normal blind 10
sketch "Sketch23" plane through (0, 0, 20) normal (0, 0, 1) x (1, 0, 0)
  line L0 (-10, 0) -> (10, 0)
  line L1 (10, 0) -> (10, 148.4974)
  line L2 (10, 148.4974) -> (-10, 148.4974)
  line L3 (-10, 148.4974) -> (-10, 0)
  line L4 (-81, 148.4974) -> (81, 148.4974) projected
  point P0 (0, 0)
  point P1 (0, 0)
  point P2 (0, 148.4974)
  dimension "d97" = 20
extrude "Extrusion20" cut sketch "Sketch23" along normal blind 20
properties part number "TARM01" material "ABS Plastic"
